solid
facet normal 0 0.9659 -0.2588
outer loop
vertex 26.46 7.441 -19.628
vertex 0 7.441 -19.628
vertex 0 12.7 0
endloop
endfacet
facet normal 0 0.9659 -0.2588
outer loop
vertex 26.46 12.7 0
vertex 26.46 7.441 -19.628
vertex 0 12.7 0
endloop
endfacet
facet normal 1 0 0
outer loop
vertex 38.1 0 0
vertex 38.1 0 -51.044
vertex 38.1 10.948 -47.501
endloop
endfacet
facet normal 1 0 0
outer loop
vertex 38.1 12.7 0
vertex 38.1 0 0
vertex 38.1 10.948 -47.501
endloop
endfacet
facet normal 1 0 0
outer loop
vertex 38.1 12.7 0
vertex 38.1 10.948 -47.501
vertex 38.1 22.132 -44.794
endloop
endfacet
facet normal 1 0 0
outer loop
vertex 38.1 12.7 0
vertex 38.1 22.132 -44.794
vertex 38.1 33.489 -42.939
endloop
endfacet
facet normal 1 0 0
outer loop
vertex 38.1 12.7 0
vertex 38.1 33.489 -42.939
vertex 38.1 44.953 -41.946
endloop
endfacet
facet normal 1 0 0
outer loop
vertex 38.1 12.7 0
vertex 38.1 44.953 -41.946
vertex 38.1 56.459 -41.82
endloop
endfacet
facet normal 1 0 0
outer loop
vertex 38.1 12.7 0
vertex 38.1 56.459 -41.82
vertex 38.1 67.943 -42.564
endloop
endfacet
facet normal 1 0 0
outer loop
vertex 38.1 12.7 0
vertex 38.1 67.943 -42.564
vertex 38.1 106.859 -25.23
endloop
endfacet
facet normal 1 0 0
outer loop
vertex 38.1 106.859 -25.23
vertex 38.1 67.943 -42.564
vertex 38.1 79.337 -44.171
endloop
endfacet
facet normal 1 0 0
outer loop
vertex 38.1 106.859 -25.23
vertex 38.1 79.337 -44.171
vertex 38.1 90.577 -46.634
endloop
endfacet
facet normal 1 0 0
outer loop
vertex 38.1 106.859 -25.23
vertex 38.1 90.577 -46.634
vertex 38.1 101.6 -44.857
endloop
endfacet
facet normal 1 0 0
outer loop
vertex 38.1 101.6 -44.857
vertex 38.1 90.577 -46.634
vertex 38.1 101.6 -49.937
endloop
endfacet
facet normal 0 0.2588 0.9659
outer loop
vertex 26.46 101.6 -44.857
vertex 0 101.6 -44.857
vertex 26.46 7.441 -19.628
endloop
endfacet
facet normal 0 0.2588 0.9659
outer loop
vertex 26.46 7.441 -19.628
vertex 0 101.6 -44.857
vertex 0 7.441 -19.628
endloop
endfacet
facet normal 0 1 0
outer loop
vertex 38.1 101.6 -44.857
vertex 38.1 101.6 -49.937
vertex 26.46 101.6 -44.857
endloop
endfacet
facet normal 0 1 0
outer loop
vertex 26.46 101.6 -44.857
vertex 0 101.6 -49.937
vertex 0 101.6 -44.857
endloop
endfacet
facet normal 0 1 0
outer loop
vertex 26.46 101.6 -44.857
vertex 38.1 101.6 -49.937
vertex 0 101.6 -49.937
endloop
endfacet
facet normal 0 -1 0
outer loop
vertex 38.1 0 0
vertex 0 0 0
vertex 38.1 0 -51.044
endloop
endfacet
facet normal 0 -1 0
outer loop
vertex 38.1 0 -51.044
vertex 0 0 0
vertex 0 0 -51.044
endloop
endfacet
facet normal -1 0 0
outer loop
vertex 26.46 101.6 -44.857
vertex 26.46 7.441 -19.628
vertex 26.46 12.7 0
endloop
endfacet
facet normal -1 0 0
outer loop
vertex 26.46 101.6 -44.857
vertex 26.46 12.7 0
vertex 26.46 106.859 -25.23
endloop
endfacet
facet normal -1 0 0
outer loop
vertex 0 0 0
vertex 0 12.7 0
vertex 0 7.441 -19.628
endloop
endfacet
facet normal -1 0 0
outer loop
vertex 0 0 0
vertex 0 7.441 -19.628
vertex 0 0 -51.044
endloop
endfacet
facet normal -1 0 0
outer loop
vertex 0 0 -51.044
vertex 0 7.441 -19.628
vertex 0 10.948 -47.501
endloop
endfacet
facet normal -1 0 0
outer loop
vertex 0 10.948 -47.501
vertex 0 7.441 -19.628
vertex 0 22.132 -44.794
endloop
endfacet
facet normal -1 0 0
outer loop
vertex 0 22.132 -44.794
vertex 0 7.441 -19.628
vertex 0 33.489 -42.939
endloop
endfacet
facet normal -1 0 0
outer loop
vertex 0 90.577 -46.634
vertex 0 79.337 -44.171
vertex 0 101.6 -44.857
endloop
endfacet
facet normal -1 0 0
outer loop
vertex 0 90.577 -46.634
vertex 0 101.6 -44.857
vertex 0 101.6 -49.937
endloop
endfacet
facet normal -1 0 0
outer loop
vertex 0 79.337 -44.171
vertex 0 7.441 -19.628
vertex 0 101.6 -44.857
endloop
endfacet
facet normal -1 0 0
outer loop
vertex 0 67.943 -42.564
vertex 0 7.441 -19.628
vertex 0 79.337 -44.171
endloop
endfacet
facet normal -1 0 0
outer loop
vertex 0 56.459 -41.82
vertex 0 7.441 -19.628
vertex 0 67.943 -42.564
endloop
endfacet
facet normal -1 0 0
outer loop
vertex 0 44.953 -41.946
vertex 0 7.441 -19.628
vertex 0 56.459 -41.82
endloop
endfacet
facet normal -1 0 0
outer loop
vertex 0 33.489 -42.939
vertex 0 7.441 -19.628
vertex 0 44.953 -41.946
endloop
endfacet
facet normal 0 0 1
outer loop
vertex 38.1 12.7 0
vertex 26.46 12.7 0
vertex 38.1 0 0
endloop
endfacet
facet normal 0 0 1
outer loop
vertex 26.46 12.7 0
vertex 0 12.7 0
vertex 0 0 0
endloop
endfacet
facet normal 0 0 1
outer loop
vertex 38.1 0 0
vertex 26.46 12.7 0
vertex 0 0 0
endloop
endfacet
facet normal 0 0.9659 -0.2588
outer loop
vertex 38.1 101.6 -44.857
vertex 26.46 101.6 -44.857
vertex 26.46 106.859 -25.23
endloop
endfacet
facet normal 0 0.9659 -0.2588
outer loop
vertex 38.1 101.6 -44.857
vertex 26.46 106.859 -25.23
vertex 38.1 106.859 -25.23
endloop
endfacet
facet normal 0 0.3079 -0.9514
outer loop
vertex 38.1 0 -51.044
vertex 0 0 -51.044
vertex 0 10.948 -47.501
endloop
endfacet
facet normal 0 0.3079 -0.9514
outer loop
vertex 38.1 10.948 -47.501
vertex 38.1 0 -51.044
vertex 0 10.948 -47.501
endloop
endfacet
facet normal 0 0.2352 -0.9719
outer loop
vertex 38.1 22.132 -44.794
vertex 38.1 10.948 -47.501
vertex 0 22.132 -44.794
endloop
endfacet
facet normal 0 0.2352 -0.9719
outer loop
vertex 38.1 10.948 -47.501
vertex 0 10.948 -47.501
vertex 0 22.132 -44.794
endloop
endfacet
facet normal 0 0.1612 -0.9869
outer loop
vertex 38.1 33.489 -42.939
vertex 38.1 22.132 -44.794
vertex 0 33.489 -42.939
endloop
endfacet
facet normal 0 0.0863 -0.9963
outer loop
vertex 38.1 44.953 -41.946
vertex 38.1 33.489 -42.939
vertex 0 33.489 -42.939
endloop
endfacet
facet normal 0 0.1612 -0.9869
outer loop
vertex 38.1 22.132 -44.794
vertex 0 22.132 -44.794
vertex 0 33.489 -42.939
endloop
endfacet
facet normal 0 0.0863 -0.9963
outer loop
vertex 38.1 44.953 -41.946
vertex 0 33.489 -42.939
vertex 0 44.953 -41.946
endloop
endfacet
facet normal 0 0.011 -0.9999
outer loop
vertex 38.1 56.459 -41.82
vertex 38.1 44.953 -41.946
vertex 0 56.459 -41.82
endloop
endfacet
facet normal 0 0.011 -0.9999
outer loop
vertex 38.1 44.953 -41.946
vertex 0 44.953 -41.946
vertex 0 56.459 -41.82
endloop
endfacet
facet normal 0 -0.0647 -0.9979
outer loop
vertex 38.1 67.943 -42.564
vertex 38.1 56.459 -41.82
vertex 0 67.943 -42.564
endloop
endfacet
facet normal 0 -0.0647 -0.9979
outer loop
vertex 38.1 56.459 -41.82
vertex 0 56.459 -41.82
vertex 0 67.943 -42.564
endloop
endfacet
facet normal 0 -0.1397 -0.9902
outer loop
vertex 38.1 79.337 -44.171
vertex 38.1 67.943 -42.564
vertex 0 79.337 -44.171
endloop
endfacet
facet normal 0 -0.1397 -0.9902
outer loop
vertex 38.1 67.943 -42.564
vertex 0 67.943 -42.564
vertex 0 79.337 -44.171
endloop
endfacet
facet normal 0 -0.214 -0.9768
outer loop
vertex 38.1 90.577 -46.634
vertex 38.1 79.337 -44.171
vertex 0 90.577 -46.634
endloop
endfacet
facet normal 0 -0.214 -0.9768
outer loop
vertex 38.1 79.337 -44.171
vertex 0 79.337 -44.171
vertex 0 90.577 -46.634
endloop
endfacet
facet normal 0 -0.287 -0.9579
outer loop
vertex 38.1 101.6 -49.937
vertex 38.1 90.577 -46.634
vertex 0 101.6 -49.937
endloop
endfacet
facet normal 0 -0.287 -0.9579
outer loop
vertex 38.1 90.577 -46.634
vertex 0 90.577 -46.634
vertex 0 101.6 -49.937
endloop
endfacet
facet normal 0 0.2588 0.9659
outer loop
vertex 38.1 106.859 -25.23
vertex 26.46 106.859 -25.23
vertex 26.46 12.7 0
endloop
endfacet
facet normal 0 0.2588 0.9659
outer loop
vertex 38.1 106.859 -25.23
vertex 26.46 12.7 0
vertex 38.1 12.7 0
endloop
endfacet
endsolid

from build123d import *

# Parameters (mm, degrees)
BOSS_EXTRUDE1_DEPTH = 38.1
SKETCH2_W           = 11.640498825
SKETCH2_H           = 97.480780029
BOSS_EXTRUDE2_DEPTH = 20.32


with BuildPart() as part:
    # Sketch1 → Boss-Extrude1 (new body)
    with BuildSketch(Plane(origin=(0, 0, 0), x_dir=(0, 0, -1), z_dir=(1, 0, 0))):
        with BuildLine():
            Line((0, 0), (51.044233981, 0))
            ThreePointArc((51.044233981, 0), (41.774414057, 50.705050847), (49.937495193, 101.6))
            Line((49.937495193, 101.6), (44.857495193, 101.6))
            Line((44.857495193, 101.6), (19.62761279, 7.440797004))
            Line((19.62761279, 7.440797004), (0, 12.7))
            Line((0, 12.7), (0, 0))
        make_face()
    extrude(amount=BOSS_EXTRUDE1_DEPTH)

    # Sketch2 → Boss-Extrude2 (add)
    with BuildSketch(Plane(origin=(0, -4.408464311, -16.45261279), x_dir=(1, 0, 0), z_dir=(0, 0.258819045, 0.965925826))):
        with Locations((32.279750588, 61.007648009)):
            Rectangle(SKETCH2_W, SKETCH2_H)
    extrude(amount=BOSS_EXTRUDE2_DEPTH)


solid = part.part
